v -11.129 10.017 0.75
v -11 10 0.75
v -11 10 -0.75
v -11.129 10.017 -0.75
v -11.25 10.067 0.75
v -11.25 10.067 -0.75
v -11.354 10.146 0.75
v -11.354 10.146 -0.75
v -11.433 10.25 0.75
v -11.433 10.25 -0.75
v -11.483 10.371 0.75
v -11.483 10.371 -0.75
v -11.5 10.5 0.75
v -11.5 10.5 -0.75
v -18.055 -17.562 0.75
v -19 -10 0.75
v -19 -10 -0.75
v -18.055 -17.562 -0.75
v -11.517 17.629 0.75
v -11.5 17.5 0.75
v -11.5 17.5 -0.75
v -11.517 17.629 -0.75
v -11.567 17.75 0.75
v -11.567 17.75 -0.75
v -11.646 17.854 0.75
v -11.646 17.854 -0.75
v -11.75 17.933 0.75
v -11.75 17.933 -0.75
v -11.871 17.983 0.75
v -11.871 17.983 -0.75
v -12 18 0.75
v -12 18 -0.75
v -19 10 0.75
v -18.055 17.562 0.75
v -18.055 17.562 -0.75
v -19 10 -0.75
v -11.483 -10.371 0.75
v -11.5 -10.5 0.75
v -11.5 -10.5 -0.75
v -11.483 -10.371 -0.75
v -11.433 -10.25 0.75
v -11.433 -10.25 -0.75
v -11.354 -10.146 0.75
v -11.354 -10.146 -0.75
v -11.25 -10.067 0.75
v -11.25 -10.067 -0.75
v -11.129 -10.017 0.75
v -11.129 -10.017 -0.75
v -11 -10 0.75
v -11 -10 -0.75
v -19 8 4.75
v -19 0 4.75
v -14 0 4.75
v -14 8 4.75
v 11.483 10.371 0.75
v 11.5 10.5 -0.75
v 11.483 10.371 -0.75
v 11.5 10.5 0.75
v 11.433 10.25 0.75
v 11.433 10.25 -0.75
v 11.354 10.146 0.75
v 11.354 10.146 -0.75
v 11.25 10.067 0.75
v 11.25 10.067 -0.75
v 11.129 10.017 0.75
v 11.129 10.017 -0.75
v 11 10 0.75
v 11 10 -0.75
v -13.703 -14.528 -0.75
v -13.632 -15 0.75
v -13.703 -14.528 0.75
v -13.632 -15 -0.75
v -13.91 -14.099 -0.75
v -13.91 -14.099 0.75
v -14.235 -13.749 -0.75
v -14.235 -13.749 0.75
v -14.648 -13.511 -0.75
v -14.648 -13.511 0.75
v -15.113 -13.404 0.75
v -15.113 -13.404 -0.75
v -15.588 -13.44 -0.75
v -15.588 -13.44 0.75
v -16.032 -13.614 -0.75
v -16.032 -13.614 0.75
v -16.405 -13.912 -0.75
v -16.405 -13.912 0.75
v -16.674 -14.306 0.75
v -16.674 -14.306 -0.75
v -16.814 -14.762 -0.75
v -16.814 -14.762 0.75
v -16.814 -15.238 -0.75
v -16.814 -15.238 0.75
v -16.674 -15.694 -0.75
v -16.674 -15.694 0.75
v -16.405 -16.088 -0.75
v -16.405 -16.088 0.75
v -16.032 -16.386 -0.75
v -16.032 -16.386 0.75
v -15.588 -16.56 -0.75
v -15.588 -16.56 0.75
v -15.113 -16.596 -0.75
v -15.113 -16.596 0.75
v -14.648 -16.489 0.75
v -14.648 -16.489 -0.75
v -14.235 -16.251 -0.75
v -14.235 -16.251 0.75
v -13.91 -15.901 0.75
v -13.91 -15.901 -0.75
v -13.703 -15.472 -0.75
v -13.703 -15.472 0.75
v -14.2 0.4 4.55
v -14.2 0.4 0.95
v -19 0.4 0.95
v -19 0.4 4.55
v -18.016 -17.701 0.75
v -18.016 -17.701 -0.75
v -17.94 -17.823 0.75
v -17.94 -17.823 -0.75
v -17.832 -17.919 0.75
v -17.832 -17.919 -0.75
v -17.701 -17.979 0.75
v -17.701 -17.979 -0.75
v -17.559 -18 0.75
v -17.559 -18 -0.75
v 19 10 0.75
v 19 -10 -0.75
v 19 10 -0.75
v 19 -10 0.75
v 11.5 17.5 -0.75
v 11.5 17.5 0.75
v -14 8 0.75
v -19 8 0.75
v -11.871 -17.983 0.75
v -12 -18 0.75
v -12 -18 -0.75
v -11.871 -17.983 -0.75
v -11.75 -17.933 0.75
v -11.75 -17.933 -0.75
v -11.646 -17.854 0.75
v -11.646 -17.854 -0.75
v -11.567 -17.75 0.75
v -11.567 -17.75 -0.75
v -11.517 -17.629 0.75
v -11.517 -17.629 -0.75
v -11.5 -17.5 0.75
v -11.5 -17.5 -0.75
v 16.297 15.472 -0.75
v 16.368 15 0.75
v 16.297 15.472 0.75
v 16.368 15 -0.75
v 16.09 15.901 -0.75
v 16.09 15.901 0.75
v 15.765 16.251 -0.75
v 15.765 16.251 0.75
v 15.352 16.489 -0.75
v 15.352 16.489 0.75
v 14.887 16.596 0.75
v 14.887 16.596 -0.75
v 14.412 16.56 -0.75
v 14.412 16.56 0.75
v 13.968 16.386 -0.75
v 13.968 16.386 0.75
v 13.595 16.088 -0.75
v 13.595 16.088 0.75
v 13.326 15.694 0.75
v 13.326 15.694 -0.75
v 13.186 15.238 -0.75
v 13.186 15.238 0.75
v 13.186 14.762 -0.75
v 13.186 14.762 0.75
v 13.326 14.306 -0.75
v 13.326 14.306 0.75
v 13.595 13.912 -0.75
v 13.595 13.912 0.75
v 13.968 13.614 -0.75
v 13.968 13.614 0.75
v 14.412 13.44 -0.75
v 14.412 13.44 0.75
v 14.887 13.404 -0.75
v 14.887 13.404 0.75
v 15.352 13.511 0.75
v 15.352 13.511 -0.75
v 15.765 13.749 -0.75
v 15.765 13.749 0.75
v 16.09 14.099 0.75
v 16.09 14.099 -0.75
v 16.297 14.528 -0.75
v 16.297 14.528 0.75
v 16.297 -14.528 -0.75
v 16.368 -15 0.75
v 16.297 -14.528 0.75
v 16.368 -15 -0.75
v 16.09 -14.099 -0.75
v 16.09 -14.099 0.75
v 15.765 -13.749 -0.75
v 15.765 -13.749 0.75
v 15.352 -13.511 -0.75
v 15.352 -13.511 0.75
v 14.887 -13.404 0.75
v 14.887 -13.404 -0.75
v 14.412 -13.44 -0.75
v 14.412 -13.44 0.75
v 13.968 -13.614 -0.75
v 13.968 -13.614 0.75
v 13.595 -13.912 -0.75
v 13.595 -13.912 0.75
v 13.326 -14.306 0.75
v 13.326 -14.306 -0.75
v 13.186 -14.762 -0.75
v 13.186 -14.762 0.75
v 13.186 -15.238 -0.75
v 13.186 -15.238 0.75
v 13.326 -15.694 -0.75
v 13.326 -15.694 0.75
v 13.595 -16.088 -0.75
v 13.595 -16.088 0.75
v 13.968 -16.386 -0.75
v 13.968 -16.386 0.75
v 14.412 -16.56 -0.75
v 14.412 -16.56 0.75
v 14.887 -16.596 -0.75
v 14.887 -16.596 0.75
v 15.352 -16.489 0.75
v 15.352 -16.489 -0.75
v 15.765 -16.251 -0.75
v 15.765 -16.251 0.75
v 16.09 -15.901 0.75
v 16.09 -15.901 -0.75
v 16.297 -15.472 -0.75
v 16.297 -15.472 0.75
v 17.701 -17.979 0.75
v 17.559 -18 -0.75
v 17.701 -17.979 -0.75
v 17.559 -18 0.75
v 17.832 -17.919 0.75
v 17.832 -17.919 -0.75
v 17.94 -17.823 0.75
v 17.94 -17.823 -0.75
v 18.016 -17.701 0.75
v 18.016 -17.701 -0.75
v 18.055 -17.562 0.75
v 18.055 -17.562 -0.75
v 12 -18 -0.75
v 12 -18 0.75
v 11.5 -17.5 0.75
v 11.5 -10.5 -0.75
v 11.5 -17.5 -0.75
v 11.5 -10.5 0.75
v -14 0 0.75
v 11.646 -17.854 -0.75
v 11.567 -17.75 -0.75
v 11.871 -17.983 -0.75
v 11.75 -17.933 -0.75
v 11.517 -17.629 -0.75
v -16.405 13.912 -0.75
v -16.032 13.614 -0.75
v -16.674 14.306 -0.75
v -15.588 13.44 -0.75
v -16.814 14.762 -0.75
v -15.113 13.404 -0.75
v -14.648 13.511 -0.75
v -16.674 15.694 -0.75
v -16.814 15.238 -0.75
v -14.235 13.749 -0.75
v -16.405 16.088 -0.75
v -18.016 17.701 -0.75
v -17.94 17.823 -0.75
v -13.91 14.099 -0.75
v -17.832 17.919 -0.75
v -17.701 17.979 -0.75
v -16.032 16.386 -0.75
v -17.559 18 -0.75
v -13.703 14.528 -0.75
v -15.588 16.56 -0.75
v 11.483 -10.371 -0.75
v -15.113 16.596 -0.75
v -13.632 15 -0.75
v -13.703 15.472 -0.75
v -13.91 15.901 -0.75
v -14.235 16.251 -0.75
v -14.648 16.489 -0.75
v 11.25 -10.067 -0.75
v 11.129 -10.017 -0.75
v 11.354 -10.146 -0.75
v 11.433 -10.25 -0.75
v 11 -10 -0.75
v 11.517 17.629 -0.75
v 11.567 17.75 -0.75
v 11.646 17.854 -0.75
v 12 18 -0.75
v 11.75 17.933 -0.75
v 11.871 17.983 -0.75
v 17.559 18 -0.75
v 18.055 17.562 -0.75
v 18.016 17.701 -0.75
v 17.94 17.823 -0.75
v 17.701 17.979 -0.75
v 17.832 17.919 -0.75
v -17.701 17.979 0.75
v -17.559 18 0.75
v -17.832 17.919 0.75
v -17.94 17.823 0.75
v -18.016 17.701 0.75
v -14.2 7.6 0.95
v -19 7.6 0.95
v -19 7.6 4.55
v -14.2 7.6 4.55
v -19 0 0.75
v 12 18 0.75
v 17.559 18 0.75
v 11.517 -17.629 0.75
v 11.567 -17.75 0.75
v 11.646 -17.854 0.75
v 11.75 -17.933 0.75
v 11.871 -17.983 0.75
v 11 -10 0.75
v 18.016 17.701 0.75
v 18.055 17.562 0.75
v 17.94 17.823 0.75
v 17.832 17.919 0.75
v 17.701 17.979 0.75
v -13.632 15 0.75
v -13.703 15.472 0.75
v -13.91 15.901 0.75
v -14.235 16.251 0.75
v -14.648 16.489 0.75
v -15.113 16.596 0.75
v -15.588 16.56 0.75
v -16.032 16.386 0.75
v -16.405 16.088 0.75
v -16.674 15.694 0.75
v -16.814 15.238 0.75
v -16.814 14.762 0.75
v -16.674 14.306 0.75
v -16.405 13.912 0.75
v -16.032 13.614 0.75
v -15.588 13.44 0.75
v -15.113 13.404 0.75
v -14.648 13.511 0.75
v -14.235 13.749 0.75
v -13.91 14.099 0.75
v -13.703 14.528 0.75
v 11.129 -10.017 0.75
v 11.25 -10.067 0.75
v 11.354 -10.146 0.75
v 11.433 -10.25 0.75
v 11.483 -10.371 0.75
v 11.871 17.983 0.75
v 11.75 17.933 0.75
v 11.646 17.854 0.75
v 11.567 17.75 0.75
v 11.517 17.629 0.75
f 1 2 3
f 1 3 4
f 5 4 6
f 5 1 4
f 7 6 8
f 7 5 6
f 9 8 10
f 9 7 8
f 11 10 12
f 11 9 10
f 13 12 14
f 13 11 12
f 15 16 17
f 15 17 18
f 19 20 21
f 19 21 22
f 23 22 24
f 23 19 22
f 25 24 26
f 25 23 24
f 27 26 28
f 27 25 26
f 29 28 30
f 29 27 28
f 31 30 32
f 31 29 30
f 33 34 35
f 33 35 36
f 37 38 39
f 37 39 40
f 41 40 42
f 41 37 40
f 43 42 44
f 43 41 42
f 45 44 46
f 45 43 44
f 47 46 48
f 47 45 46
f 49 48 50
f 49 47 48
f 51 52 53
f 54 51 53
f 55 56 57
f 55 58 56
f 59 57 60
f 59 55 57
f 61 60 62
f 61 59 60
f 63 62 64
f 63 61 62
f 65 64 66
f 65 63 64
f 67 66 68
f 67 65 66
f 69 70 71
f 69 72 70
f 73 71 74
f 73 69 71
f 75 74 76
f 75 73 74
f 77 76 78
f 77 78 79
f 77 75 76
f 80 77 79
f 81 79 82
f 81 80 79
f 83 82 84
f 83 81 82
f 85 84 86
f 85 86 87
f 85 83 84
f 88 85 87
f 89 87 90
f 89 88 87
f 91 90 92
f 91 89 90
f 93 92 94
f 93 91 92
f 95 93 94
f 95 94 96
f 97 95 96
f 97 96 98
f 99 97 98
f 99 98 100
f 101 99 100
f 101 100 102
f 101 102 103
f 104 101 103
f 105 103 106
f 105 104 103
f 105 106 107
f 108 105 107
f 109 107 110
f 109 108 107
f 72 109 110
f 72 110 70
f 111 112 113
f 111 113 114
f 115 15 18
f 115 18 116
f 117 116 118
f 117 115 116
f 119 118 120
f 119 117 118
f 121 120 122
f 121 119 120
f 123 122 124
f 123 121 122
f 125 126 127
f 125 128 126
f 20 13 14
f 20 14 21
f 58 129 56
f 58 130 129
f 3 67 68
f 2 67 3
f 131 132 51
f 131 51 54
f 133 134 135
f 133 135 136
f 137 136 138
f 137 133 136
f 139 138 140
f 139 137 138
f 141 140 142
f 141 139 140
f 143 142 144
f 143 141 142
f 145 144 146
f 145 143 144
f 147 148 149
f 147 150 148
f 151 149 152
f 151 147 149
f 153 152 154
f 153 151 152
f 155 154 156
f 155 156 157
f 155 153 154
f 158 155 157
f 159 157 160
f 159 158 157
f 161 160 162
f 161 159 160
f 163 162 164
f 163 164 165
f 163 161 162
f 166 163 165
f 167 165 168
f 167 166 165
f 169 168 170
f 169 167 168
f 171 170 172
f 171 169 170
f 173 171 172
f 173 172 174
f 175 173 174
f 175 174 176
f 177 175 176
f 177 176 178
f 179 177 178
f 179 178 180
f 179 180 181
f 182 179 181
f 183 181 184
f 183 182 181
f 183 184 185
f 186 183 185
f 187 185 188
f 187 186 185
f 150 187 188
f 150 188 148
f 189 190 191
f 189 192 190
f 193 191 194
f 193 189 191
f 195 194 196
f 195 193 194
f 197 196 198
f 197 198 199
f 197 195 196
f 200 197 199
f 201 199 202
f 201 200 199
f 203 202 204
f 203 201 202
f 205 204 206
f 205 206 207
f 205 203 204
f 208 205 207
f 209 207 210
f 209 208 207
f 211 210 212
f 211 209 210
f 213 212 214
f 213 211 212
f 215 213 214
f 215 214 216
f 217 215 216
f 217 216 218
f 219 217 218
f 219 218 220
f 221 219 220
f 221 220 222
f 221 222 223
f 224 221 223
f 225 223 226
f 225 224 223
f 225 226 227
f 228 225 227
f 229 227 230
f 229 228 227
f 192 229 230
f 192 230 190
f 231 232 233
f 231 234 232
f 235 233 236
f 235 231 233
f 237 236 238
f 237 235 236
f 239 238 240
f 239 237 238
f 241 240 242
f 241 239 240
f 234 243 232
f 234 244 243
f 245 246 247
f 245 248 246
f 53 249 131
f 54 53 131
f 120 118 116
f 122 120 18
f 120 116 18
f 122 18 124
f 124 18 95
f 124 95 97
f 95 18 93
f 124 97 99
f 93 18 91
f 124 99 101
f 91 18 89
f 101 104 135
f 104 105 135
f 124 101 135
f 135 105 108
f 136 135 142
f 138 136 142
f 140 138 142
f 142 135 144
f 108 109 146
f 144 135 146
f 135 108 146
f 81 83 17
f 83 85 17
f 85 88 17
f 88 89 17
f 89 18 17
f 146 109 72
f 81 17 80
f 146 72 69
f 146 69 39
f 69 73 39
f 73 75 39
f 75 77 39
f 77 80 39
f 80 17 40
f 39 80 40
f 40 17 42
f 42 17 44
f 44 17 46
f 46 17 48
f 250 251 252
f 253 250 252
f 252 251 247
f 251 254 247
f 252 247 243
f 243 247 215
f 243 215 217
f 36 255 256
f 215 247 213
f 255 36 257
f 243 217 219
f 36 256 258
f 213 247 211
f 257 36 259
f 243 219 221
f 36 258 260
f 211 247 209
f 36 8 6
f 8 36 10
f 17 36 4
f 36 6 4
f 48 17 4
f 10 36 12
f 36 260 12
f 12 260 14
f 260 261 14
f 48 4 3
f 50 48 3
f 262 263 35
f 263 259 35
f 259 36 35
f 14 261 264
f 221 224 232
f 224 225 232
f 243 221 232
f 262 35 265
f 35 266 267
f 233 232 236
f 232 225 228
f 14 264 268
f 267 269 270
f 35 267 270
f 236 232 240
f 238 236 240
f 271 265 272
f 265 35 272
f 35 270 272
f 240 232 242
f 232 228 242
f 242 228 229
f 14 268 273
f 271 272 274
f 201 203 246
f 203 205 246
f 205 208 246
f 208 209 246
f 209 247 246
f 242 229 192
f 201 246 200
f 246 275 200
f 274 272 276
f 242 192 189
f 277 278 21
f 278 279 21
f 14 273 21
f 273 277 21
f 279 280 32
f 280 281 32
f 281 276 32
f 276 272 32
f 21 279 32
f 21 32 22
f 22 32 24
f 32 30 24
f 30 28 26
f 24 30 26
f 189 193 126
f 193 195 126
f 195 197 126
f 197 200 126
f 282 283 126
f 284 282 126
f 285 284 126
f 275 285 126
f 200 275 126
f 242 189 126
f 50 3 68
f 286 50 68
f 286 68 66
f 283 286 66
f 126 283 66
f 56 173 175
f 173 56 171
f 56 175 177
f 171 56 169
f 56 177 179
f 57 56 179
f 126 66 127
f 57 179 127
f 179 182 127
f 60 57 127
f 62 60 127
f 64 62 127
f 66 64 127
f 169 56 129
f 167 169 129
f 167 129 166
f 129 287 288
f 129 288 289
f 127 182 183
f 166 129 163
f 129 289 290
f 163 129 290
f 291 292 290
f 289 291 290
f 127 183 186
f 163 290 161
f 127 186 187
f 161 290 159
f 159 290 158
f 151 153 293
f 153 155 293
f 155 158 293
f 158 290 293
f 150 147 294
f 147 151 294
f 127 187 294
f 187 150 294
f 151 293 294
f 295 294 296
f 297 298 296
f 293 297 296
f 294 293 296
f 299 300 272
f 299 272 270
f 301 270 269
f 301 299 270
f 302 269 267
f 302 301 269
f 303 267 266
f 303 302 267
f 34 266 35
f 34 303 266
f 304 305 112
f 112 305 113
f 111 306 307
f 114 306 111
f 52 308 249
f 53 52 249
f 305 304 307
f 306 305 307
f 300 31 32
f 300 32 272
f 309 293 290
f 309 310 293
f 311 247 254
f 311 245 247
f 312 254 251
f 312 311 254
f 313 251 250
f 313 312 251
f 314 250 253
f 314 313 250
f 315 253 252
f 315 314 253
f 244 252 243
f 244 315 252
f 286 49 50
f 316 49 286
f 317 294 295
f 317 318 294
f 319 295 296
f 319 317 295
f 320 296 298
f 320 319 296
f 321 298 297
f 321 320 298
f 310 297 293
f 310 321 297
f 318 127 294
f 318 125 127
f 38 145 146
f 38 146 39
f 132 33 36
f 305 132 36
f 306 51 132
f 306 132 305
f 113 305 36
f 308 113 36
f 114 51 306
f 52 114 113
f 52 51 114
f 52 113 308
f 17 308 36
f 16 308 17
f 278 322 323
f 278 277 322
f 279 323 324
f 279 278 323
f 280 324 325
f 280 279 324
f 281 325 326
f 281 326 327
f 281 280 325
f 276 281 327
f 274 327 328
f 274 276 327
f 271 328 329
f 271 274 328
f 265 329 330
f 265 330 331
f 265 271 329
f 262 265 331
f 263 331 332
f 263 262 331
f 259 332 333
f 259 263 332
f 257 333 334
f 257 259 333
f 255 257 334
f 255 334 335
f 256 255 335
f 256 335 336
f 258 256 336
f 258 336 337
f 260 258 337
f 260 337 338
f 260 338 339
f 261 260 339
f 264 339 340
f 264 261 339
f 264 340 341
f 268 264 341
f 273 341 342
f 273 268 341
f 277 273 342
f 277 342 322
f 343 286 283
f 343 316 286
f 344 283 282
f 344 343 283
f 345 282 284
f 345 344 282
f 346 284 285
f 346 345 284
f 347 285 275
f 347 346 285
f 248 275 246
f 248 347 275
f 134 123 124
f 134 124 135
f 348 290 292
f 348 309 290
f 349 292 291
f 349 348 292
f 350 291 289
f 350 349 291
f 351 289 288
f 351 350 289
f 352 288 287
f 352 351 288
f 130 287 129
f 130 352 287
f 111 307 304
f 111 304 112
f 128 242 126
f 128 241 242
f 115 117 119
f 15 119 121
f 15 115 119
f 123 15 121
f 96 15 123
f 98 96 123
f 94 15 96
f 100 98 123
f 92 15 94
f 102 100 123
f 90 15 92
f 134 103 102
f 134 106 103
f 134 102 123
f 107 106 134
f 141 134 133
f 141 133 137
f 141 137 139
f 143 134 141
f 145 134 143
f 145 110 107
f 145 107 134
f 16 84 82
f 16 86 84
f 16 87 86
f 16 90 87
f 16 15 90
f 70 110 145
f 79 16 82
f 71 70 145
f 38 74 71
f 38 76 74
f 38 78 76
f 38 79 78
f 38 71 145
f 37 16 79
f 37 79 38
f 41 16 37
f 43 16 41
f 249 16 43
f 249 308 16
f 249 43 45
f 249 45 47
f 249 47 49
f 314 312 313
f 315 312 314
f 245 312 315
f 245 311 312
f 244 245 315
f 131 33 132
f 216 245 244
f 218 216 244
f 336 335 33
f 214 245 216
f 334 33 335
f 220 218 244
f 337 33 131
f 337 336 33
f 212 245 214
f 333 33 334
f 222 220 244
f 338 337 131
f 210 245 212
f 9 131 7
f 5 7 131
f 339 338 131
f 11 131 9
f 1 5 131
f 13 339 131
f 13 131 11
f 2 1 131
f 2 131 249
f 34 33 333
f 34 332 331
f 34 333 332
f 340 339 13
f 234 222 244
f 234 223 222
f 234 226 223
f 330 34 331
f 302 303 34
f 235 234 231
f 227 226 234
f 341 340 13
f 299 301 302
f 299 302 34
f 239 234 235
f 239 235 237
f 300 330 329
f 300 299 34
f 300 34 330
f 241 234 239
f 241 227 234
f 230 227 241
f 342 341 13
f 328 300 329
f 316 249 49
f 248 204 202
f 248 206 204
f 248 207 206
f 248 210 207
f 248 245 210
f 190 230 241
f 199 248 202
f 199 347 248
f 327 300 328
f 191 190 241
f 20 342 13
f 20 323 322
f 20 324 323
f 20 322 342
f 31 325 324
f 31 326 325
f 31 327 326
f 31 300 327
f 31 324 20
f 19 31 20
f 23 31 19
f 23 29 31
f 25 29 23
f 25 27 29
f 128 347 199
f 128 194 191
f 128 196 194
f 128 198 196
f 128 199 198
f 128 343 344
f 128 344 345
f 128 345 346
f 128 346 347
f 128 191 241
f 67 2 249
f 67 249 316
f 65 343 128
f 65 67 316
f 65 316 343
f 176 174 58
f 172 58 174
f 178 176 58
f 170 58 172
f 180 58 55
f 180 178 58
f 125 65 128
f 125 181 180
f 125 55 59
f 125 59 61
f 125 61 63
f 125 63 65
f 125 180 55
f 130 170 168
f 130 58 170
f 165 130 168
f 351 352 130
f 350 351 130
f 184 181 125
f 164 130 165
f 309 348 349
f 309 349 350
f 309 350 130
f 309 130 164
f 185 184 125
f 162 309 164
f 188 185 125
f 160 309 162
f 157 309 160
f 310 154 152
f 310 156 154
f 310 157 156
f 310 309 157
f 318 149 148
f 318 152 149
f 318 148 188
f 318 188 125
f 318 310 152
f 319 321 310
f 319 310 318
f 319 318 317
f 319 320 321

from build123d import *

# Parameters (mm, degrees)
F0_R     = 1.6
F1_DEPTH = 0.75
F2_W     = 5
F2_H     = 8
F3_DEPTH = 4
F4_W     = 7.2
F4_H     = 3.6
F5_DEPTH = 4.8


with BuildPart() as f1:
    # F0 (on Top) → F1 (new body, symmetric)
    with BuildSketch(Plane.XY):
        with BuildLine():
            Line((11, 10), (-11, 10))
            ThreePointArc((-11, 10), (-11.353553, 10.146447), (-11.5, 10.5))
            Line((-11.5, 10.5), (-11.5, 17.5))
            ThreePointArc((-11.5, 17.5), (-11.646447, 17.853553), (-12, 18))
            Line((-12, 18), (-17.558609, 18))
            ThreePointArc((-17.558609, 18), (-17.88951, 17.874839), (-18.054748, 17.562017))
            Line((-18.054748, 17.562017), (-19, 10))
            Line((-19, 10), (-19, 0))
            Line((-19, 0), (-19, -10))
            Line((-19, -10), (-18.054748, -17.562017))
            ThreePointArc((-18.054748, -17.562017), (-17.88951, -17.874839), (-17.558609, -18))
            Line((-17.558609, -18), (-12, -18))
            ThreePointArc((-12, -18), (-11.646447, -17.853553), (-11.5, -17.5))
            Line((-11.5, -17.5), (-11.5, -10.5))
            ThreePointArc((-11.5, -10.5), (-11.353553, -10.146447), (-11, -10))
            Line((-11, -10), (11, -10))
            ThreePointArc((11, -10), (11.353553, -10.146447), (11.5, -10.5))
            Line((11.5, -10.5), (11.5, -17.5))
            ThreePointArc((11.5, -17.5), (11.646447, -17.853553), (12, -18))
            Line((12, -18), (17.558609, -18))
            ThreePointArc((17.558609, -18), (17.88951, -17.874839), (18.054748, -17.562017))
            Line((18.054748, -17.562017), (19, -10))
            Line((19, -10), (19, 0))
            Line((19, 0), (19, 10))
            Line((19, 10), (18.054748, 17.562017))
            ThreePointArc((18.054748, 17.562017), (17.88951, 17.874839), (17.558609, 18))
            Line((17.558609, 18), (12, 18))
            ThreePointArc((12, 18), (11.646447, 17.853553), (11.5, 17.5))
            Line((11.5, 17.5), (11.5, 10.5))
            ThreePointArc((11.5, 10.5), (11.353553, 10.146447), (11, 10))
        make_face()
        with Locations((-15.232269, -15)):
            Circle(F0_R, mode=Mode.SUBTRACT)
        with Locations((14.767731, -15)):
            Circle(F0_R, mode=Mode.SUBTRACT)
        with Locations((-15.232269, 15)):
            Circle(F0_R, mode=Mode.SUBTRACT)
        with Locations((14.767731, 15)):
            Circle(F0_R, mode=Mode.SUBTRACT)
    extrude(amount=F1_DEPTH, both=True)

    # F2 (on face) → F3 (join)
    with BuildSketch(Plane.XY.offset(0.75)):
        with Locations((-16.5, 4)):
            Rectangle(F2_W, F2_H)
    extrude(amount=F3_DEPTH)

    # F4 (on face) → F5 (cut)
    with BuildSketch(Plane(origin=(-19, 0, 0), x_dir=(0, -1, 0), z_dir=(-1, 0, 0))):
        with Locations((-4, 2.75)):
            Rectangle(F4_W, F4_H)
    extrude(amount=-F5_DEPTH, mode=Mode.SUBTRACT)


solid = f1.part
